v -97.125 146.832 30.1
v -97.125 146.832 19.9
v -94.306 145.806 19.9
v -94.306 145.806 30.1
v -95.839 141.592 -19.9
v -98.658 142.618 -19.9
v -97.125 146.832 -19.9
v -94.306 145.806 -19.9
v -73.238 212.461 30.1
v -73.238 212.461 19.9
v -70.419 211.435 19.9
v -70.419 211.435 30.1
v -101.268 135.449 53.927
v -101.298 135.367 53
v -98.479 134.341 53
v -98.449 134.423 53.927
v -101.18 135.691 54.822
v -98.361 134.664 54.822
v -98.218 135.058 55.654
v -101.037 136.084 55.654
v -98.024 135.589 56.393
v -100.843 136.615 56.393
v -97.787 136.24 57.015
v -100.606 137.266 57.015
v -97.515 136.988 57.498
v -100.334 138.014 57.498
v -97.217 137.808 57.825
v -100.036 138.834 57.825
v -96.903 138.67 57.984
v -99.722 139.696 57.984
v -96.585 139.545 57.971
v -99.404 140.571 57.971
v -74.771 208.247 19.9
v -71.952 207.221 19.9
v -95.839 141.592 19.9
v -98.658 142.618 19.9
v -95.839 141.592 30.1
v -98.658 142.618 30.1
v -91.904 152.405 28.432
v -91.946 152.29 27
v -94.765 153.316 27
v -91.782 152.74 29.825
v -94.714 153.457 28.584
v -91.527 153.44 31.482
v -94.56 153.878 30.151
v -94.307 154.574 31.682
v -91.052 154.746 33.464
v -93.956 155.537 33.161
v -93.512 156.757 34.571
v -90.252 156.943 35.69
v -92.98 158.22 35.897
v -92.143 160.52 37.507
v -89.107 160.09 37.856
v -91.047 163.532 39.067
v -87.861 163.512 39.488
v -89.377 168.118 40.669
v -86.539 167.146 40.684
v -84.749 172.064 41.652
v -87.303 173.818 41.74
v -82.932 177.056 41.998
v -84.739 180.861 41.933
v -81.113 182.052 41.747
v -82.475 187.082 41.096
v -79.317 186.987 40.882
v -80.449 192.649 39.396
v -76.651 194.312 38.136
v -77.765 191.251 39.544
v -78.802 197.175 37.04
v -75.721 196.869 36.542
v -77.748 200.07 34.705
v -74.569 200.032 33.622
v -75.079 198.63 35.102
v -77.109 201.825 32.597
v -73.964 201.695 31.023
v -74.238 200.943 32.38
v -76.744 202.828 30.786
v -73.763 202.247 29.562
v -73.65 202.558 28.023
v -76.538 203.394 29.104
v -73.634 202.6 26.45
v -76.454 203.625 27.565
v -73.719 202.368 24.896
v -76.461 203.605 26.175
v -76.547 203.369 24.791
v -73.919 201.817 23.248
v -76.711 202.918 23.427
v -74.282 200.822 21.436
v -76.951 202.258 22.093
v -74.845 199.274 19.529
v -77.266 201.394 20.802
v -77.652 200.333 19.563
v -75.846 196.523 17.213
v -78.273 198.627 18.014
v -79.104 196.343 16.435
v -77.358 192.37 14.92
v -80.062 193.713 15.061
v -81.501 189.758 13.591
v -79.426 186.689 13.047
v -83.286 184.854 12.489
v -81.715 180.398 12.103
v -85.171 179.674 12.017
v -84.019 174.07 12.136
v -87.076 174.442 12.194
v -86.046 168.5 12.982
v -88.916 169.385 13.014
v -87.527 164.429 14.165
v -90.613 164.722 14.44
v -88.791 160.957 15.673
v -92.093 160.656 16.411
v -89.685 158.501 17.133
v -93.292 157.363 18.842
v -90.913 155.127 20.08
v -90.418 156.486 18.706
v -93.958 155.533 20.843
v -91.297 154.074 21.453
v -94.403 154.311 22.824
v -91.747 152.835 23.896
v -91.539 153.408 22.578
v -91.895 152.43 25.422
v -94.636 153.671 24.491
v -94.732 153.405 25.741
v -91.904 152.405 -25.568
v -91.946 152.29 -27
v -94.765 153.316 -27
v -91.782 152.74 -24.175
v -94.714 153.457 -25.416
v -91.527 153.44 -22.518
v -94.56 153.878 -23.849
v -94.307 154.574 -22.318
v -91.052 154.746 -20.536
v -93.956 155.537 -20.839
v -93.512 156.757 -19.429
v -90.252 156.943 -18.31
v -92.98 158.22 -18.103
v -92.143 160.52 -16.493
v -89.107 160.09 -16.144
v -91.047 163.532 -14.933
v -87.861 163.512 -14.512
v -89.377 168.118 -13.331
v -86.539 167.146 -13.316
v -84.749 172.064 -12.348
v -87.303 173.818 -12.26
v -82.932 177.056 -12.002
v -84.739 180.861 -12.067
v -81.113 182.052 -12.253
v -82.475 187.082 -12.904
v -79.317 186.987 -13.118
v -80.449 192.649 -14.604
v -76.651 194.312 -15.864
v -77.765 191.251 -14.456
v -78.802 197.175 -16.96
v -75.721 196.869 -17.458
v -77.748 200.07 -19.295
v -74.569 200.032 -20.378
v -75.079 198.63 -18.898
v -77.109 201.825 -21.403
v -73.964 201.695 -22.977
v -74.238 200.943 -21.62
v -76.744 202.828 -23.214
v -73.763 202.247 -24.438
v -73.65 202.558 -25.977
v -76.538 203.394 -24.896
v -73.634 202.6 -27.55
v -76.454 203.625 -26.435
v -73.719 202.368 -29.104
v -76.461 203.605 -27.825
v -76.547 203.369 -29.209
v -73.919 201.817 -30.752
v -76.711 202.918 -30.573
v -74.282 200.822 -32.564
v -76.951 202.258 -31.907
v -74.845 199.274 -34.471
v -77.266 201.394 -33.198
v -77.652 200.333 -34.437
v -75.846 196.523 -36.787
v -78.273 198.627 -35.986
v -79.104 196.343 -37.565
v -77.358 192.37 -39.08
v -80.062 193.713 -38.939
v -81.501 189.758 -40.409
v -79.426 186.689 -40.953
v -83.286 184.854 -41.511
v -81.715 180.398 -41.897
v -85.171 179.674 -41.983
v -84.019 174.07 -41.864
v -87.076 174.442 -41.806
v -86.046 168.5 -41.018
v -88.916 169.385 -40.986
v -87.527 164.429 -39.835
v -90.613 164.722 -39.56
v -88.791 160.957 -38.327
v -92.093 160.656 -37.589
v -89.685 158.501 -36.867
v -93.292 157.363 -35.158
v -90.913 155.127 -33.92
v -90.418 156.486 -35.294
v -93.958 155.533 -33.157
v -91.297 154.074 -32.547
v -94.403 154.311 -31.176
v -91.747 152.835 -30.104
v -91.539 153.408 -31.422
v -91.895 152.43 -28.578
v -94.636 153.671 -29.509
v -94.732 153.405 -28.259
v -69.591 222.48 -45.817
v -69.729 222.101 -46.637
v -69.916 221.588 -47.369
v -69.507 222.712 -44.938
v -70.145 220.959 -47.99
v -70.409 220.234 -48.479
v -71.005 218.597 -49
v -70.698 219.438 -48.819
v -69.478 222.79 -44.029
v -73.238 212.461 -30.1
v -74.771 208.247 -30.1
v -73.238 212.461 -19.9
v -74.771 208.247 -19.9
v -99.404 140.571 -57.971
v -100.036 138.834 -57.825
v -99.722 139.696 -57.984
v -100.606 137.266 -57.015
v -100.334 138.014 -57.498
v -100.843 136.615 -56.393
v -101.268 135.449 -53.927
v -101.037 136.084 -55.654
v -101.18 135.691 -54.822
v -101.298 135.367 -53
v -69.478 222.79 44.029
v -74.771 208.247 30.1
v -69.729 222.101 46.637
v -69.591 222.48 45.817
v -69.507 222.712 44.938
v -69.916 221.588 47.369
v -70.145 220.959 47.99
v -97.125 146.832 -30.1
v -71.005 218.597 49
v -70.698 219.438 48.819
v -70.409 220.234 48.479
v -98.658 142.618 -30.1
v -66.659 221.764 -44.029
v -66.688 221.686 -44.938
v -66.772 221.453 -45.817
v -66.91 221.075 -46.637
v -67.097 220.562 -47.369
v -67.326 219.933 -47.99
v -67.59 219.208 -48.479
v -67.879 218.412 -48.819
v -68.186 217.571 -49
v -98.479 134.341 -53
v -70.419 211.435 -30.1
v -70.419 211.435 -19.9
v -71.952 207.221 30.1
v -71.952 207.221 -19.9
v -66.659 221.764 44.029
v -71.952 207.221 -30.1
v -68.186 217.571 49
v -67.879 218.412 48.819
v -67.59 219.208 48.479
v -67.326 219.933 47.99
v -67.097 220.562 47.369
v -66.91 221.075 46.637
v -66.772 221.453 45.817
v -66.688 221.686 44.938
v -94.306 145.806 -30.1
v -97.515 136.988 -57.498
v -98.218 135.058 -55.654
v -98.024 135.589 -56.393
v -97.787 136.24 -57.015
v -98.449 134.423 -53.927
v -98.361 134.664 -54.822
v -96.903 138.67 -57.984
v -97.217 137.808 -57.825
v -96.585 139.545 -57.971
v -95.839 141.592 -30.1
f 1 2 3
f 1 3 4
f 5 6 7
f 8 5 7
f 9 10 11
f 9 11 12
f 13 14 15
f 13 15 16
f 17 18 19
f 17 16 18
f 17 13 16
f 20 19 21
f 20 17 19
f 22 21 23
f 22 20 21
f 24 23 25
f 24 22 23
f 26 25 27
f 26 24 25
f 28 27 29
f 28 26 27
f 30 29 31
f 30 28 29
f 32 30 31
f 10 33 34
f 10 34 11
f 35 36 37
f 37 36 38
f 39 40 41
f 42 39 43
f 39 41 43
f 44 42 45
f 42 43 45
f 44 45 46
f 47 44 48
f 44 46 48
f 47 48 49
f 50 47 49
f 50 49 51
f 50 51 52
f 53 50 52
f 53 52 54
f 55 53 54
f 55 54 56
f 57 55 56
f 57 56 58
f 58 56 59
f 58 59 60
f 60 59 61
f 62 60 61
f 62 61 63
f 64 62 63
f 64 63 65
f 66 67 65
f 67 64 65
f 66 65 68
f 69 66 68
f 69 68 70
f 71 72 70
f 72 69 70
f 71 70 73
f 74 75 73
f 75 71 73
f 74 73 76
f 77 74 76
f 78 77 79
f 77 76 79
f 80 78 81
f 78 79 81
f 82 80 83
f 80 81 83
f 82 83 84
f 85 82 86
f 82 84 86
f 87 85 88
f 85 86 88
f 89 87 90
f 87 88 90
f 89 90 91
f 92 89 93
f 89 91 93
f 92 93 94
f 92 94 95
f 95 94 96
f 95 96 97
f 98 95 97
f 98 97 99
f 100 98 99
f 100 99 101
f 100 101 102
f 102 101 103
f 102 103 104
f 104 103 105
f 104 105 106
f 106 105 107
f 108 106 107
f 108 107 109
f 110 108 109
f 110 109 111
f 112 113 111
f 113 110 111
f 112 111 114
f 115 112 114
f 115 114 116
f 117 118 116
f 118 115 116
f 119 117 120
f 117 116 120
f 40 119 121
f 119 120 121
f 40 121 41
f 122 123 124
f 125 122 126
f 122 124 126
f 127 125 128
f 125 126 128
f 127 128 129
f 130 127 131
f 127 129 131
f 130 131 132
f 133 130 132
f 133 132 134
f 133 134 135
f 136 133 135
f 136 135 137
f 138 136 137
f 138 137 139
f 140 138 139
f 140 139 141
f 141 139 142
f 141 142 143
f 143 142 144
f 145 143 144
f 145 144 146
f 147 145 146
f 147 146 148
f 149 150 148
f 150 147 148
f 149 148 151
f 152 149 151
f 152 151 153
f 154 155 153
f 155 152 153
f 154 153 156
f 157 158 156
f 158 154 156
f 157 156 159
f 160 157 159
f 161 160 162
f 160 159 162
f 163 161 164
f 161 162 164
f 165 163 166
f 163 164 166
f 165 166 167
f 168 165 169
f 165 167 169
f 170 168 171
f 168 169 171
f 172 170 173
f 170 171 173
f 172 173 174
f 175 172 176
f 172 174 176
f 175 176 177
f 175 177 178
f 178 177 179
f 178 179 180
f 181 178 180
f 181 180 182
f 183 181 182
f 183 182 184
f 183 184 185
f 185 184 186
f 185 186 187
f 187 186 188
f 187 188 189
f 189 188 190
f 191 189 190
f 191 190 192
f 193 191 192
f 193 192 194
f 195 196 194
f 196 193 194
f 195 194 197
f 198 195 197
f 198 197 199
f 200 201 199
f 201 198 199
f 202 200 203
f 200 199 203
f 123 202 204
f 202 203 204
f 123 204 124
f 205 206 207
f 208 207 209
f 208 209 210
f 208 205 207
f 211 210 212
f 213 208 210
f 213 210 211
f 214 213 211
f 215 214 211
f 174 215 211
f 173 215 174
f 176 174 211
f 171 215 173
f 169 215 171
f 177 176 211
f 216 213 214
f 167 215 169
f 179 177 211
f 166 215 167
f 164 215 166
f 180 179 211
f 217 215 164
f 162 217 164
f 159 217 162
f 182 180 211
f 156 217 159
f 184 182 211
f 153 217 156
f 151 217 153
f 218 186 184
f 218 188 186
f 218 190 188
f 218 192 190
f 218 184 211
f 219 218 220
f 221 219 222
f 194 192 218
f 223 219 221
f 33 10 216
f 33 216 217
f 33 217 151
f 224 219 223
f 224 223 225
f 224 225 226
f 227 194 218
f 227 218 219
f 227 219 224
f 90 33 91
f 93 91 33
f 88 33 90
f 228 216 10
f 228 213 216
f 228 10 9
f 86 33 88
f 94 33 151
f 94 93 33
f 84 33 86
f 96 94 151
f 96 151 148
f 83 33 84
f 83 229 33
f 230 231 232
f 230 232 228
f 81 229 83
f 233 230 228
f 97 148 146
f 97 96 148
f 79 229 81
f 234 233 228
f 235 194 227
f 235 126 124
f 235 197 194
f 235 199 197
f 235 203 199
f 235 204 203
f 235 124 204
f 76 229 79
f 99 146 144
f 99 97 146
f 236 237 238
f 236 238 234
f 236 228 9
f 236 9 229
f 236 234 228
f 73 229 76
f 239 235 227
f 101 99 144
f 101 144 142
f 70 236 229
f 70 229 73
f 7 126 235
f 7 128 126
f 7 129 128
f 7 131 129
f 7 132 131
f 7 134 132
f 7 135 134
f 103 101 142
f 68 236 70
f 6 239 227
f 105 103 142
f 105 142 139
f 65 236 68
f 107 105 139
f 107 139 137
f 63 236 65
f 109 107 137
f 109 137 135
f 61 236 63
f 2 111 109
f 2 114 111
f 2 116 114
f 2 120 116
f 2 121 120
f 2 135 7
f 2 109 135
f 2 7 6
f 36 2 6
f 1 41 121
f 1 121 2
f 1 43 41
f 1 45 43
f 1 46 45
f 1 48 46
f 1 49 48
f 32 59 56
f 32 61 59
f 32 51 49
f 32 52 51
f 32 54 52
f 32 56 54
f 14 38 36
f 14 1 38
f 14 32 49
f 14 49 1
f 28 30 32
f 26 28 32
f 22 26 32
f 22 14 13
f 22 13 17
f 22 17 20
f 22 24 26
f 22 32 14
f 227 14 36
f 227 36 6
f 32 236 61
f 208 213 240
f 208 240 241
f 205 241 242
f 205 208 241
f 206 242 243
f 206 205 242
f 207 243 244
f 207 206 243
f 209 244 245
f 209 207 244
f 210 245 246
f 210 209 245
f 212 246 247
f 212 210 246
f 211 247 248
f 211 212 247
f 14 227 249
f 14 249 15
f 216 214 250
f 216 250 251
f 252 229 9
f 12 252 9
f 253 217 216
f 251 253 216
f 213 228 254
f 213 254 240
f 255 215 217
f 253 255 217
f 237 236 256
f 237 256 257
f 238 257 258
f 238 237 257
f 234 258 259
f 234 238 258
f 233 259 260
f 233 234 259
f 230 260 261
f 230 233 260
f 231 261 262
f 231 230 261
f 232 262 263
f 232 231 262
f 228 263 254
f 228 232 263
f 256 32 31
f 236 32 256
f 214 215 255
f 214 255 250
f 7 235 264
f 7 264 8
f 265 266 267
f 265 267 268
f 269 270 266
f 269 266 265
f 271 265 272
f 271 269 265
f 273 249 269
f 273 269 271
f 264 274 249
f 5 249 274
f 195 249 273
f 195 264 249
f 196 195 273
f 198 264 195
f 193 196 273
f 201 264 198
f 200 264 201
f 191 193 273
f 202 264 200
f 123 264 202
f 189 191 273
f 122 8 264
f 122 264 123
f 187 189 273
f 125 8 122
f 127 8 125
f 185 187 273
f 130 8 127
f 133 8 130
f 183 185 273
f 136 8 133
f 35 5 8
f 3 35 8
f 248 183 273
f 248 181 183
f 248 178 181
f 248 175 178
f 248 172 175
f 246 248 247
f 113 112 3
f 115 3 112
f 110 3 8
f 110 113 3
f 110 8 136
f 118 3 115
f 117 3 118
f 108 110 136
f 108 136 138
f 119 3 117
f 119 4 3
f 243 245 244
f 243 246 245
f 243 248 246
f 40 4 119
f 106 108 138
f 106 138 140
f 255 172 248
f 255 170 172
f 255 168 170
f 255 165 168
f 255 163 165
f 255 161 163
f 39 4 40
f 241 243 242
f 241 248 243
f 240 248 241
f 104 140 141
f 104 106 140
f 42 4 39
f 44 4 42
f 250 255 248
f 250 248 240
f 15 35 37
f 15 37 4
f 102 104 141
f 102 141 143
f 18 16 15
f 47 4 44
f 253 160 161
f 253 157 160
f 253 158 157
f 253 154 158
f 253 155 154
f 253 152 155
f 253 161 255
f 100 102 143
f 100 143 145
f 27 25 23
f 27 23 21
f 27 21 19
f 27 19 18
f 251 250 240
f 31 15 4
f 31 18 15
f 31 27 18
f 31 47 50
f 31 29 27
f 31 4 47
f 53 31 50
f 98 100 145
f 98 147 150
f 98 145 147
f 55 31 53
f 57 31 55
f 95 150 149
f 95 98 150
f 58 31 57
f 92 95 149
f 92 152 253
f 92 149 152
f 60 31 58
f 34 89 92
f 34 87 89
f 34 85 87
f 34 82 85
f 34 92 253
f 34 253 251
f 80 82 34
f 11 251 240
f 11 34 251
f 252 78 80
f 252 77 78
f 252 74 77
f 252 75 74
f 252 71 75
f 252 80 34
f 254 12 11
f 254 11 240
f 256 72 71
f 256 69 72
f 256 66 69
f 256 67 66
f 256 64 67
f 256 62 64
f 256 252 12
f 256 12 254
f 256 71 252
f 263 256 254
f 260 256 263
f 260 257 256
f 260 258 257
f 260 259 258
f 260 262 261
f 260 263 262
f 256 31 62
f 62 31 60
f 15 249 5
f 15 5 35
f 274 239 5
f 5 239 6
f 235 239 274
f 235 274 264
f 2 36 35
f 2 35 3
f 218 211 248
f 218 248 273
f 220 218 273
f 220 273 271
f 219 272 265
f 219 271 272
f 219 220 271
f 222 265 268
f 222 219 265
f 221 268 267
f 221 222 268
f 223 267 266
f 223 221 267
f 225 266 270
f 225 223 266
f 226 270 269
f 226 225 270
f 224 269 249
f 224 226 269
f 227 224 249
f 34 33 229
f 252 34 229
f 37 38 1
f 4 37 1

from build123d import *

# Parameters (mm, degrees)
BOSS_EXTRUDE1_DEPTH        = 58
SKETCH2_OUTSIDE_W          = 147.986
SKETCH2_OUTSIDE_H          = 126.948
TAB_AND_SLOT_CONTOUR_DEPTH = 3
MOUNTING_TAB_SLOT_REACH    = 197.382
SKETCH4_W                  = 10.2
SKETCH4_H                  = 4.48444402
EYE_APERTURE_REACH         = 197.382
SKETCH3_RX                 = 26.778256145
SKETCH3_RY                 = 15


with BuildPart() as part:
    # Sketch1 → Boss-Extrude1 (new, symmetric)
    with BuildSketch(Plane.XY):
        Polygon((-66.659178779, 221.764297559), (-69.478256642, 222.790357989), (-101.297584098, 135.367474301), (-98.478506236, 134.341413871), align=None)
    extrude(amount=BOSS_EXTRUDE1_DEPTH, both=True)

    # Sketch2 outside → tab and slot contour (cut)
    with BuildSketch(Plane(origin=(-132.954285367, 48.391402392, 0), x_dir=(0, 0, 1), z_dir=(-0.9396926207859096, 0.34202014332566527, 0))):
        with Locations((0, 139.075)):
            Rectangle(SKETCH2_OUTSIDE_W, SKETCH2_OUTSIDE_H)
        with BuildLine():
            Line((57.97107056, 98.09508485), (49, 181.128574477))
            ThreePointArc((49, 181.128574477), (47.369183029, 184.312070804), (44.02892944, 185.59149209))
            Line((44.02892944, 185.59149209), (-44.02892944, 185.59149209))
            ThreePointArc((-44.02892944, 185.59149209), (-47.369183029, 184.312070804), (-49, 181.128574477))
            Line((-49, 181.128574477), (-57.97107056, 98.09508485))
            ThreePointArc((-57.97107056, 98.09508485), (-56.720578714, 94.217748875), (-53, 92.558002463))
            Line((-53, 92.558002463), (53, 92.558002463))
            ThreePointArc((53, 92.558002463), (56.720578714, 94.217748875), (57.97107056, 98.09508485))
        make_face(mode=Mode.SUBTRACT)
    extrude(amount=-TAB_AND_SLOT_CONTOUR_DEPTH, mode=Mode.SUBTRACT)

    # Sketch4 → mounting tab slot (cut, up to next)
    with BuildSketch(Plane(origin=(-132.954285367, 48.391402392, 0), x_dir=(0, 0, 1), z_dir=(-0.9396926207859096, 0.3420201433256655, 0)), mode=Mode.PRIVATE) as mounting_tab_slot_sk1:
        with Locations((-25, 172.357359377)):
            Rectangle(SKETCH4_W, SKETCH4_H)
    mounting_tab_slot_tool1 = extrude(mounting_tab_slot_sk1.sketch, amount=-MOUNTING_TAB_SLOT_REACH, mode=Mode.PRIVATE) & part.part
    # Sketch4 → mounting tab slot (cut, up to next)
    with BuildSketch(Plane(origin=(-132.954285367, 48.391402392, 0), x_dir=(0, 0, 1), z_dir=(-0.9396926207859096, 0.3420201433256655, 0)), mode=Mode.PRIVATE) as mounting_tab_slot_sk2:
        with Locations((-25, 102.516403068)):
            Rectangle(SKETCH4_W, SKETCH4_H)
    mounting_tab_slot_tool2 = extrude(mounting_tab_slot_sk2.sketch, amount=-MOUNTING_TAB_SLOT_REACH, mode=Mode.PRIVATE) & part.part
    # Sketch4 → mounting tab slot (cut, up to next)
    with BuildSketch(Plane(origin=(-132.954285367, 48.391402392, 0), x_dir=(0, 0, 1), z_dir=(-0.9396926207859096, 0.3420201433256655, 0)), mode=Mode.PRIVATE) as mounting_tab_slot_sk3:
        with Locations((25, 172.357359377)):
            Rectangle(SKETCH4_W, SKETCH4_H)
    mounting_tab_slot_tool3 = extrude(mounting_tab_slot_sk3.sketch, amount=-MOUNTING_TAB_SLOT_REACH, mode=Mode.PRIVATE) & part.part
    # Sketch4 → mounting tab slot (cut, up to next)
    with BuildSketch(Plane(origin=(-132.954285367, 48.391402392, 0), x_dir=(0, 0, 1), z_dir=(-0.9396926207859096, 0.3420201433256655, 0)), mode=Mode.PRIVATE) as mounting_tab_slot_sk4:
        with Locations((25, 102.516403068)):
            Rectangle(SKETCH4_W, SKETCH4_H)
    mounting_tab_slot_tool4 = extrude(mounting_tab_slot_sk4.sketch, amount=-MOUNTING_TAB_SLOT_REACH, mode=Mode.PRIVATE) & part.part
    add(mounting_tab_slot_tool1.solids().sort_by_distance((-74.004597, 210.354341, -25))[0], mode=Mode.SUBTRACT)
    add(mounting_tab_slot_tool2.solids().sort_by_distance((-97.89161, 144.72531, -25))[0], mode=Mode.SUBTRACT)
    add(mounting_tab_slot_tool3.solids().sort_by_distance((-74.004597, 210.354341, 25))[0], mode=Mode.SUBTRACT)
    add(mounting_tab_slot_tool4.solids().sort_by_distance((-97.89161, 144.72531, 25))[0], mode=Mode.SUBTRACT)

    # Sketch3 → eye aperture (cut, up to next)
    with BuildSketch(Plane(origin=(-132.954285367, 48.391402392, 0), x_dir=(0, 0, 1), z_dir=(-0.9396926207859096, 0.3420201433256652, 0)), mode=Mode.PRIVATE) as eye_aperture_sk1:
        with Locations(Location((-27, 138.436881223), (0, 0, -90))):
            Ellipse(SKETCH3_RX, SKETCH3_RY)
    eye_aperture_tool1 = extrude(eye_aperture_sk1.sketch, amount=-EYE_APERTURE_REACH, mode=Mode.PRIVATE) & part.part
    # Sketch3 → eye aperture (cut, up to next)
    with BuildSketch(Plane(origin=(-132.954285367, 48.391402392, 0), x_dir=(0, 0, 1), z_dir=(-0.9396926207859096, 0.3420201433256652, 0)), mode=Mode.PRIVATE) as eye_aperture_sk2:
        with Locations(Location((27, 138.436881223), (0, 0, -90))):
            Ellipse(SKETCH3_RX, SKETCH3_RY)
    eye_aperture_tool2 = extrude(eye_aperture_sk2.sketch, amount=-EYE_APERTURE_REACH, mode=Mode.PRIVATE) & part.part
    add(eye_aperture_tool1.solids().sort_by_distance((-85.606083, 178.479518, -27))[0], mode=Mode.SUBTRACT)
    add(eye_aperture_tool2.solids().sort_by_distance((-85.606083, 178.479518, 27))[0], mode=Mode.SUBTRACT)


solid = part.part
